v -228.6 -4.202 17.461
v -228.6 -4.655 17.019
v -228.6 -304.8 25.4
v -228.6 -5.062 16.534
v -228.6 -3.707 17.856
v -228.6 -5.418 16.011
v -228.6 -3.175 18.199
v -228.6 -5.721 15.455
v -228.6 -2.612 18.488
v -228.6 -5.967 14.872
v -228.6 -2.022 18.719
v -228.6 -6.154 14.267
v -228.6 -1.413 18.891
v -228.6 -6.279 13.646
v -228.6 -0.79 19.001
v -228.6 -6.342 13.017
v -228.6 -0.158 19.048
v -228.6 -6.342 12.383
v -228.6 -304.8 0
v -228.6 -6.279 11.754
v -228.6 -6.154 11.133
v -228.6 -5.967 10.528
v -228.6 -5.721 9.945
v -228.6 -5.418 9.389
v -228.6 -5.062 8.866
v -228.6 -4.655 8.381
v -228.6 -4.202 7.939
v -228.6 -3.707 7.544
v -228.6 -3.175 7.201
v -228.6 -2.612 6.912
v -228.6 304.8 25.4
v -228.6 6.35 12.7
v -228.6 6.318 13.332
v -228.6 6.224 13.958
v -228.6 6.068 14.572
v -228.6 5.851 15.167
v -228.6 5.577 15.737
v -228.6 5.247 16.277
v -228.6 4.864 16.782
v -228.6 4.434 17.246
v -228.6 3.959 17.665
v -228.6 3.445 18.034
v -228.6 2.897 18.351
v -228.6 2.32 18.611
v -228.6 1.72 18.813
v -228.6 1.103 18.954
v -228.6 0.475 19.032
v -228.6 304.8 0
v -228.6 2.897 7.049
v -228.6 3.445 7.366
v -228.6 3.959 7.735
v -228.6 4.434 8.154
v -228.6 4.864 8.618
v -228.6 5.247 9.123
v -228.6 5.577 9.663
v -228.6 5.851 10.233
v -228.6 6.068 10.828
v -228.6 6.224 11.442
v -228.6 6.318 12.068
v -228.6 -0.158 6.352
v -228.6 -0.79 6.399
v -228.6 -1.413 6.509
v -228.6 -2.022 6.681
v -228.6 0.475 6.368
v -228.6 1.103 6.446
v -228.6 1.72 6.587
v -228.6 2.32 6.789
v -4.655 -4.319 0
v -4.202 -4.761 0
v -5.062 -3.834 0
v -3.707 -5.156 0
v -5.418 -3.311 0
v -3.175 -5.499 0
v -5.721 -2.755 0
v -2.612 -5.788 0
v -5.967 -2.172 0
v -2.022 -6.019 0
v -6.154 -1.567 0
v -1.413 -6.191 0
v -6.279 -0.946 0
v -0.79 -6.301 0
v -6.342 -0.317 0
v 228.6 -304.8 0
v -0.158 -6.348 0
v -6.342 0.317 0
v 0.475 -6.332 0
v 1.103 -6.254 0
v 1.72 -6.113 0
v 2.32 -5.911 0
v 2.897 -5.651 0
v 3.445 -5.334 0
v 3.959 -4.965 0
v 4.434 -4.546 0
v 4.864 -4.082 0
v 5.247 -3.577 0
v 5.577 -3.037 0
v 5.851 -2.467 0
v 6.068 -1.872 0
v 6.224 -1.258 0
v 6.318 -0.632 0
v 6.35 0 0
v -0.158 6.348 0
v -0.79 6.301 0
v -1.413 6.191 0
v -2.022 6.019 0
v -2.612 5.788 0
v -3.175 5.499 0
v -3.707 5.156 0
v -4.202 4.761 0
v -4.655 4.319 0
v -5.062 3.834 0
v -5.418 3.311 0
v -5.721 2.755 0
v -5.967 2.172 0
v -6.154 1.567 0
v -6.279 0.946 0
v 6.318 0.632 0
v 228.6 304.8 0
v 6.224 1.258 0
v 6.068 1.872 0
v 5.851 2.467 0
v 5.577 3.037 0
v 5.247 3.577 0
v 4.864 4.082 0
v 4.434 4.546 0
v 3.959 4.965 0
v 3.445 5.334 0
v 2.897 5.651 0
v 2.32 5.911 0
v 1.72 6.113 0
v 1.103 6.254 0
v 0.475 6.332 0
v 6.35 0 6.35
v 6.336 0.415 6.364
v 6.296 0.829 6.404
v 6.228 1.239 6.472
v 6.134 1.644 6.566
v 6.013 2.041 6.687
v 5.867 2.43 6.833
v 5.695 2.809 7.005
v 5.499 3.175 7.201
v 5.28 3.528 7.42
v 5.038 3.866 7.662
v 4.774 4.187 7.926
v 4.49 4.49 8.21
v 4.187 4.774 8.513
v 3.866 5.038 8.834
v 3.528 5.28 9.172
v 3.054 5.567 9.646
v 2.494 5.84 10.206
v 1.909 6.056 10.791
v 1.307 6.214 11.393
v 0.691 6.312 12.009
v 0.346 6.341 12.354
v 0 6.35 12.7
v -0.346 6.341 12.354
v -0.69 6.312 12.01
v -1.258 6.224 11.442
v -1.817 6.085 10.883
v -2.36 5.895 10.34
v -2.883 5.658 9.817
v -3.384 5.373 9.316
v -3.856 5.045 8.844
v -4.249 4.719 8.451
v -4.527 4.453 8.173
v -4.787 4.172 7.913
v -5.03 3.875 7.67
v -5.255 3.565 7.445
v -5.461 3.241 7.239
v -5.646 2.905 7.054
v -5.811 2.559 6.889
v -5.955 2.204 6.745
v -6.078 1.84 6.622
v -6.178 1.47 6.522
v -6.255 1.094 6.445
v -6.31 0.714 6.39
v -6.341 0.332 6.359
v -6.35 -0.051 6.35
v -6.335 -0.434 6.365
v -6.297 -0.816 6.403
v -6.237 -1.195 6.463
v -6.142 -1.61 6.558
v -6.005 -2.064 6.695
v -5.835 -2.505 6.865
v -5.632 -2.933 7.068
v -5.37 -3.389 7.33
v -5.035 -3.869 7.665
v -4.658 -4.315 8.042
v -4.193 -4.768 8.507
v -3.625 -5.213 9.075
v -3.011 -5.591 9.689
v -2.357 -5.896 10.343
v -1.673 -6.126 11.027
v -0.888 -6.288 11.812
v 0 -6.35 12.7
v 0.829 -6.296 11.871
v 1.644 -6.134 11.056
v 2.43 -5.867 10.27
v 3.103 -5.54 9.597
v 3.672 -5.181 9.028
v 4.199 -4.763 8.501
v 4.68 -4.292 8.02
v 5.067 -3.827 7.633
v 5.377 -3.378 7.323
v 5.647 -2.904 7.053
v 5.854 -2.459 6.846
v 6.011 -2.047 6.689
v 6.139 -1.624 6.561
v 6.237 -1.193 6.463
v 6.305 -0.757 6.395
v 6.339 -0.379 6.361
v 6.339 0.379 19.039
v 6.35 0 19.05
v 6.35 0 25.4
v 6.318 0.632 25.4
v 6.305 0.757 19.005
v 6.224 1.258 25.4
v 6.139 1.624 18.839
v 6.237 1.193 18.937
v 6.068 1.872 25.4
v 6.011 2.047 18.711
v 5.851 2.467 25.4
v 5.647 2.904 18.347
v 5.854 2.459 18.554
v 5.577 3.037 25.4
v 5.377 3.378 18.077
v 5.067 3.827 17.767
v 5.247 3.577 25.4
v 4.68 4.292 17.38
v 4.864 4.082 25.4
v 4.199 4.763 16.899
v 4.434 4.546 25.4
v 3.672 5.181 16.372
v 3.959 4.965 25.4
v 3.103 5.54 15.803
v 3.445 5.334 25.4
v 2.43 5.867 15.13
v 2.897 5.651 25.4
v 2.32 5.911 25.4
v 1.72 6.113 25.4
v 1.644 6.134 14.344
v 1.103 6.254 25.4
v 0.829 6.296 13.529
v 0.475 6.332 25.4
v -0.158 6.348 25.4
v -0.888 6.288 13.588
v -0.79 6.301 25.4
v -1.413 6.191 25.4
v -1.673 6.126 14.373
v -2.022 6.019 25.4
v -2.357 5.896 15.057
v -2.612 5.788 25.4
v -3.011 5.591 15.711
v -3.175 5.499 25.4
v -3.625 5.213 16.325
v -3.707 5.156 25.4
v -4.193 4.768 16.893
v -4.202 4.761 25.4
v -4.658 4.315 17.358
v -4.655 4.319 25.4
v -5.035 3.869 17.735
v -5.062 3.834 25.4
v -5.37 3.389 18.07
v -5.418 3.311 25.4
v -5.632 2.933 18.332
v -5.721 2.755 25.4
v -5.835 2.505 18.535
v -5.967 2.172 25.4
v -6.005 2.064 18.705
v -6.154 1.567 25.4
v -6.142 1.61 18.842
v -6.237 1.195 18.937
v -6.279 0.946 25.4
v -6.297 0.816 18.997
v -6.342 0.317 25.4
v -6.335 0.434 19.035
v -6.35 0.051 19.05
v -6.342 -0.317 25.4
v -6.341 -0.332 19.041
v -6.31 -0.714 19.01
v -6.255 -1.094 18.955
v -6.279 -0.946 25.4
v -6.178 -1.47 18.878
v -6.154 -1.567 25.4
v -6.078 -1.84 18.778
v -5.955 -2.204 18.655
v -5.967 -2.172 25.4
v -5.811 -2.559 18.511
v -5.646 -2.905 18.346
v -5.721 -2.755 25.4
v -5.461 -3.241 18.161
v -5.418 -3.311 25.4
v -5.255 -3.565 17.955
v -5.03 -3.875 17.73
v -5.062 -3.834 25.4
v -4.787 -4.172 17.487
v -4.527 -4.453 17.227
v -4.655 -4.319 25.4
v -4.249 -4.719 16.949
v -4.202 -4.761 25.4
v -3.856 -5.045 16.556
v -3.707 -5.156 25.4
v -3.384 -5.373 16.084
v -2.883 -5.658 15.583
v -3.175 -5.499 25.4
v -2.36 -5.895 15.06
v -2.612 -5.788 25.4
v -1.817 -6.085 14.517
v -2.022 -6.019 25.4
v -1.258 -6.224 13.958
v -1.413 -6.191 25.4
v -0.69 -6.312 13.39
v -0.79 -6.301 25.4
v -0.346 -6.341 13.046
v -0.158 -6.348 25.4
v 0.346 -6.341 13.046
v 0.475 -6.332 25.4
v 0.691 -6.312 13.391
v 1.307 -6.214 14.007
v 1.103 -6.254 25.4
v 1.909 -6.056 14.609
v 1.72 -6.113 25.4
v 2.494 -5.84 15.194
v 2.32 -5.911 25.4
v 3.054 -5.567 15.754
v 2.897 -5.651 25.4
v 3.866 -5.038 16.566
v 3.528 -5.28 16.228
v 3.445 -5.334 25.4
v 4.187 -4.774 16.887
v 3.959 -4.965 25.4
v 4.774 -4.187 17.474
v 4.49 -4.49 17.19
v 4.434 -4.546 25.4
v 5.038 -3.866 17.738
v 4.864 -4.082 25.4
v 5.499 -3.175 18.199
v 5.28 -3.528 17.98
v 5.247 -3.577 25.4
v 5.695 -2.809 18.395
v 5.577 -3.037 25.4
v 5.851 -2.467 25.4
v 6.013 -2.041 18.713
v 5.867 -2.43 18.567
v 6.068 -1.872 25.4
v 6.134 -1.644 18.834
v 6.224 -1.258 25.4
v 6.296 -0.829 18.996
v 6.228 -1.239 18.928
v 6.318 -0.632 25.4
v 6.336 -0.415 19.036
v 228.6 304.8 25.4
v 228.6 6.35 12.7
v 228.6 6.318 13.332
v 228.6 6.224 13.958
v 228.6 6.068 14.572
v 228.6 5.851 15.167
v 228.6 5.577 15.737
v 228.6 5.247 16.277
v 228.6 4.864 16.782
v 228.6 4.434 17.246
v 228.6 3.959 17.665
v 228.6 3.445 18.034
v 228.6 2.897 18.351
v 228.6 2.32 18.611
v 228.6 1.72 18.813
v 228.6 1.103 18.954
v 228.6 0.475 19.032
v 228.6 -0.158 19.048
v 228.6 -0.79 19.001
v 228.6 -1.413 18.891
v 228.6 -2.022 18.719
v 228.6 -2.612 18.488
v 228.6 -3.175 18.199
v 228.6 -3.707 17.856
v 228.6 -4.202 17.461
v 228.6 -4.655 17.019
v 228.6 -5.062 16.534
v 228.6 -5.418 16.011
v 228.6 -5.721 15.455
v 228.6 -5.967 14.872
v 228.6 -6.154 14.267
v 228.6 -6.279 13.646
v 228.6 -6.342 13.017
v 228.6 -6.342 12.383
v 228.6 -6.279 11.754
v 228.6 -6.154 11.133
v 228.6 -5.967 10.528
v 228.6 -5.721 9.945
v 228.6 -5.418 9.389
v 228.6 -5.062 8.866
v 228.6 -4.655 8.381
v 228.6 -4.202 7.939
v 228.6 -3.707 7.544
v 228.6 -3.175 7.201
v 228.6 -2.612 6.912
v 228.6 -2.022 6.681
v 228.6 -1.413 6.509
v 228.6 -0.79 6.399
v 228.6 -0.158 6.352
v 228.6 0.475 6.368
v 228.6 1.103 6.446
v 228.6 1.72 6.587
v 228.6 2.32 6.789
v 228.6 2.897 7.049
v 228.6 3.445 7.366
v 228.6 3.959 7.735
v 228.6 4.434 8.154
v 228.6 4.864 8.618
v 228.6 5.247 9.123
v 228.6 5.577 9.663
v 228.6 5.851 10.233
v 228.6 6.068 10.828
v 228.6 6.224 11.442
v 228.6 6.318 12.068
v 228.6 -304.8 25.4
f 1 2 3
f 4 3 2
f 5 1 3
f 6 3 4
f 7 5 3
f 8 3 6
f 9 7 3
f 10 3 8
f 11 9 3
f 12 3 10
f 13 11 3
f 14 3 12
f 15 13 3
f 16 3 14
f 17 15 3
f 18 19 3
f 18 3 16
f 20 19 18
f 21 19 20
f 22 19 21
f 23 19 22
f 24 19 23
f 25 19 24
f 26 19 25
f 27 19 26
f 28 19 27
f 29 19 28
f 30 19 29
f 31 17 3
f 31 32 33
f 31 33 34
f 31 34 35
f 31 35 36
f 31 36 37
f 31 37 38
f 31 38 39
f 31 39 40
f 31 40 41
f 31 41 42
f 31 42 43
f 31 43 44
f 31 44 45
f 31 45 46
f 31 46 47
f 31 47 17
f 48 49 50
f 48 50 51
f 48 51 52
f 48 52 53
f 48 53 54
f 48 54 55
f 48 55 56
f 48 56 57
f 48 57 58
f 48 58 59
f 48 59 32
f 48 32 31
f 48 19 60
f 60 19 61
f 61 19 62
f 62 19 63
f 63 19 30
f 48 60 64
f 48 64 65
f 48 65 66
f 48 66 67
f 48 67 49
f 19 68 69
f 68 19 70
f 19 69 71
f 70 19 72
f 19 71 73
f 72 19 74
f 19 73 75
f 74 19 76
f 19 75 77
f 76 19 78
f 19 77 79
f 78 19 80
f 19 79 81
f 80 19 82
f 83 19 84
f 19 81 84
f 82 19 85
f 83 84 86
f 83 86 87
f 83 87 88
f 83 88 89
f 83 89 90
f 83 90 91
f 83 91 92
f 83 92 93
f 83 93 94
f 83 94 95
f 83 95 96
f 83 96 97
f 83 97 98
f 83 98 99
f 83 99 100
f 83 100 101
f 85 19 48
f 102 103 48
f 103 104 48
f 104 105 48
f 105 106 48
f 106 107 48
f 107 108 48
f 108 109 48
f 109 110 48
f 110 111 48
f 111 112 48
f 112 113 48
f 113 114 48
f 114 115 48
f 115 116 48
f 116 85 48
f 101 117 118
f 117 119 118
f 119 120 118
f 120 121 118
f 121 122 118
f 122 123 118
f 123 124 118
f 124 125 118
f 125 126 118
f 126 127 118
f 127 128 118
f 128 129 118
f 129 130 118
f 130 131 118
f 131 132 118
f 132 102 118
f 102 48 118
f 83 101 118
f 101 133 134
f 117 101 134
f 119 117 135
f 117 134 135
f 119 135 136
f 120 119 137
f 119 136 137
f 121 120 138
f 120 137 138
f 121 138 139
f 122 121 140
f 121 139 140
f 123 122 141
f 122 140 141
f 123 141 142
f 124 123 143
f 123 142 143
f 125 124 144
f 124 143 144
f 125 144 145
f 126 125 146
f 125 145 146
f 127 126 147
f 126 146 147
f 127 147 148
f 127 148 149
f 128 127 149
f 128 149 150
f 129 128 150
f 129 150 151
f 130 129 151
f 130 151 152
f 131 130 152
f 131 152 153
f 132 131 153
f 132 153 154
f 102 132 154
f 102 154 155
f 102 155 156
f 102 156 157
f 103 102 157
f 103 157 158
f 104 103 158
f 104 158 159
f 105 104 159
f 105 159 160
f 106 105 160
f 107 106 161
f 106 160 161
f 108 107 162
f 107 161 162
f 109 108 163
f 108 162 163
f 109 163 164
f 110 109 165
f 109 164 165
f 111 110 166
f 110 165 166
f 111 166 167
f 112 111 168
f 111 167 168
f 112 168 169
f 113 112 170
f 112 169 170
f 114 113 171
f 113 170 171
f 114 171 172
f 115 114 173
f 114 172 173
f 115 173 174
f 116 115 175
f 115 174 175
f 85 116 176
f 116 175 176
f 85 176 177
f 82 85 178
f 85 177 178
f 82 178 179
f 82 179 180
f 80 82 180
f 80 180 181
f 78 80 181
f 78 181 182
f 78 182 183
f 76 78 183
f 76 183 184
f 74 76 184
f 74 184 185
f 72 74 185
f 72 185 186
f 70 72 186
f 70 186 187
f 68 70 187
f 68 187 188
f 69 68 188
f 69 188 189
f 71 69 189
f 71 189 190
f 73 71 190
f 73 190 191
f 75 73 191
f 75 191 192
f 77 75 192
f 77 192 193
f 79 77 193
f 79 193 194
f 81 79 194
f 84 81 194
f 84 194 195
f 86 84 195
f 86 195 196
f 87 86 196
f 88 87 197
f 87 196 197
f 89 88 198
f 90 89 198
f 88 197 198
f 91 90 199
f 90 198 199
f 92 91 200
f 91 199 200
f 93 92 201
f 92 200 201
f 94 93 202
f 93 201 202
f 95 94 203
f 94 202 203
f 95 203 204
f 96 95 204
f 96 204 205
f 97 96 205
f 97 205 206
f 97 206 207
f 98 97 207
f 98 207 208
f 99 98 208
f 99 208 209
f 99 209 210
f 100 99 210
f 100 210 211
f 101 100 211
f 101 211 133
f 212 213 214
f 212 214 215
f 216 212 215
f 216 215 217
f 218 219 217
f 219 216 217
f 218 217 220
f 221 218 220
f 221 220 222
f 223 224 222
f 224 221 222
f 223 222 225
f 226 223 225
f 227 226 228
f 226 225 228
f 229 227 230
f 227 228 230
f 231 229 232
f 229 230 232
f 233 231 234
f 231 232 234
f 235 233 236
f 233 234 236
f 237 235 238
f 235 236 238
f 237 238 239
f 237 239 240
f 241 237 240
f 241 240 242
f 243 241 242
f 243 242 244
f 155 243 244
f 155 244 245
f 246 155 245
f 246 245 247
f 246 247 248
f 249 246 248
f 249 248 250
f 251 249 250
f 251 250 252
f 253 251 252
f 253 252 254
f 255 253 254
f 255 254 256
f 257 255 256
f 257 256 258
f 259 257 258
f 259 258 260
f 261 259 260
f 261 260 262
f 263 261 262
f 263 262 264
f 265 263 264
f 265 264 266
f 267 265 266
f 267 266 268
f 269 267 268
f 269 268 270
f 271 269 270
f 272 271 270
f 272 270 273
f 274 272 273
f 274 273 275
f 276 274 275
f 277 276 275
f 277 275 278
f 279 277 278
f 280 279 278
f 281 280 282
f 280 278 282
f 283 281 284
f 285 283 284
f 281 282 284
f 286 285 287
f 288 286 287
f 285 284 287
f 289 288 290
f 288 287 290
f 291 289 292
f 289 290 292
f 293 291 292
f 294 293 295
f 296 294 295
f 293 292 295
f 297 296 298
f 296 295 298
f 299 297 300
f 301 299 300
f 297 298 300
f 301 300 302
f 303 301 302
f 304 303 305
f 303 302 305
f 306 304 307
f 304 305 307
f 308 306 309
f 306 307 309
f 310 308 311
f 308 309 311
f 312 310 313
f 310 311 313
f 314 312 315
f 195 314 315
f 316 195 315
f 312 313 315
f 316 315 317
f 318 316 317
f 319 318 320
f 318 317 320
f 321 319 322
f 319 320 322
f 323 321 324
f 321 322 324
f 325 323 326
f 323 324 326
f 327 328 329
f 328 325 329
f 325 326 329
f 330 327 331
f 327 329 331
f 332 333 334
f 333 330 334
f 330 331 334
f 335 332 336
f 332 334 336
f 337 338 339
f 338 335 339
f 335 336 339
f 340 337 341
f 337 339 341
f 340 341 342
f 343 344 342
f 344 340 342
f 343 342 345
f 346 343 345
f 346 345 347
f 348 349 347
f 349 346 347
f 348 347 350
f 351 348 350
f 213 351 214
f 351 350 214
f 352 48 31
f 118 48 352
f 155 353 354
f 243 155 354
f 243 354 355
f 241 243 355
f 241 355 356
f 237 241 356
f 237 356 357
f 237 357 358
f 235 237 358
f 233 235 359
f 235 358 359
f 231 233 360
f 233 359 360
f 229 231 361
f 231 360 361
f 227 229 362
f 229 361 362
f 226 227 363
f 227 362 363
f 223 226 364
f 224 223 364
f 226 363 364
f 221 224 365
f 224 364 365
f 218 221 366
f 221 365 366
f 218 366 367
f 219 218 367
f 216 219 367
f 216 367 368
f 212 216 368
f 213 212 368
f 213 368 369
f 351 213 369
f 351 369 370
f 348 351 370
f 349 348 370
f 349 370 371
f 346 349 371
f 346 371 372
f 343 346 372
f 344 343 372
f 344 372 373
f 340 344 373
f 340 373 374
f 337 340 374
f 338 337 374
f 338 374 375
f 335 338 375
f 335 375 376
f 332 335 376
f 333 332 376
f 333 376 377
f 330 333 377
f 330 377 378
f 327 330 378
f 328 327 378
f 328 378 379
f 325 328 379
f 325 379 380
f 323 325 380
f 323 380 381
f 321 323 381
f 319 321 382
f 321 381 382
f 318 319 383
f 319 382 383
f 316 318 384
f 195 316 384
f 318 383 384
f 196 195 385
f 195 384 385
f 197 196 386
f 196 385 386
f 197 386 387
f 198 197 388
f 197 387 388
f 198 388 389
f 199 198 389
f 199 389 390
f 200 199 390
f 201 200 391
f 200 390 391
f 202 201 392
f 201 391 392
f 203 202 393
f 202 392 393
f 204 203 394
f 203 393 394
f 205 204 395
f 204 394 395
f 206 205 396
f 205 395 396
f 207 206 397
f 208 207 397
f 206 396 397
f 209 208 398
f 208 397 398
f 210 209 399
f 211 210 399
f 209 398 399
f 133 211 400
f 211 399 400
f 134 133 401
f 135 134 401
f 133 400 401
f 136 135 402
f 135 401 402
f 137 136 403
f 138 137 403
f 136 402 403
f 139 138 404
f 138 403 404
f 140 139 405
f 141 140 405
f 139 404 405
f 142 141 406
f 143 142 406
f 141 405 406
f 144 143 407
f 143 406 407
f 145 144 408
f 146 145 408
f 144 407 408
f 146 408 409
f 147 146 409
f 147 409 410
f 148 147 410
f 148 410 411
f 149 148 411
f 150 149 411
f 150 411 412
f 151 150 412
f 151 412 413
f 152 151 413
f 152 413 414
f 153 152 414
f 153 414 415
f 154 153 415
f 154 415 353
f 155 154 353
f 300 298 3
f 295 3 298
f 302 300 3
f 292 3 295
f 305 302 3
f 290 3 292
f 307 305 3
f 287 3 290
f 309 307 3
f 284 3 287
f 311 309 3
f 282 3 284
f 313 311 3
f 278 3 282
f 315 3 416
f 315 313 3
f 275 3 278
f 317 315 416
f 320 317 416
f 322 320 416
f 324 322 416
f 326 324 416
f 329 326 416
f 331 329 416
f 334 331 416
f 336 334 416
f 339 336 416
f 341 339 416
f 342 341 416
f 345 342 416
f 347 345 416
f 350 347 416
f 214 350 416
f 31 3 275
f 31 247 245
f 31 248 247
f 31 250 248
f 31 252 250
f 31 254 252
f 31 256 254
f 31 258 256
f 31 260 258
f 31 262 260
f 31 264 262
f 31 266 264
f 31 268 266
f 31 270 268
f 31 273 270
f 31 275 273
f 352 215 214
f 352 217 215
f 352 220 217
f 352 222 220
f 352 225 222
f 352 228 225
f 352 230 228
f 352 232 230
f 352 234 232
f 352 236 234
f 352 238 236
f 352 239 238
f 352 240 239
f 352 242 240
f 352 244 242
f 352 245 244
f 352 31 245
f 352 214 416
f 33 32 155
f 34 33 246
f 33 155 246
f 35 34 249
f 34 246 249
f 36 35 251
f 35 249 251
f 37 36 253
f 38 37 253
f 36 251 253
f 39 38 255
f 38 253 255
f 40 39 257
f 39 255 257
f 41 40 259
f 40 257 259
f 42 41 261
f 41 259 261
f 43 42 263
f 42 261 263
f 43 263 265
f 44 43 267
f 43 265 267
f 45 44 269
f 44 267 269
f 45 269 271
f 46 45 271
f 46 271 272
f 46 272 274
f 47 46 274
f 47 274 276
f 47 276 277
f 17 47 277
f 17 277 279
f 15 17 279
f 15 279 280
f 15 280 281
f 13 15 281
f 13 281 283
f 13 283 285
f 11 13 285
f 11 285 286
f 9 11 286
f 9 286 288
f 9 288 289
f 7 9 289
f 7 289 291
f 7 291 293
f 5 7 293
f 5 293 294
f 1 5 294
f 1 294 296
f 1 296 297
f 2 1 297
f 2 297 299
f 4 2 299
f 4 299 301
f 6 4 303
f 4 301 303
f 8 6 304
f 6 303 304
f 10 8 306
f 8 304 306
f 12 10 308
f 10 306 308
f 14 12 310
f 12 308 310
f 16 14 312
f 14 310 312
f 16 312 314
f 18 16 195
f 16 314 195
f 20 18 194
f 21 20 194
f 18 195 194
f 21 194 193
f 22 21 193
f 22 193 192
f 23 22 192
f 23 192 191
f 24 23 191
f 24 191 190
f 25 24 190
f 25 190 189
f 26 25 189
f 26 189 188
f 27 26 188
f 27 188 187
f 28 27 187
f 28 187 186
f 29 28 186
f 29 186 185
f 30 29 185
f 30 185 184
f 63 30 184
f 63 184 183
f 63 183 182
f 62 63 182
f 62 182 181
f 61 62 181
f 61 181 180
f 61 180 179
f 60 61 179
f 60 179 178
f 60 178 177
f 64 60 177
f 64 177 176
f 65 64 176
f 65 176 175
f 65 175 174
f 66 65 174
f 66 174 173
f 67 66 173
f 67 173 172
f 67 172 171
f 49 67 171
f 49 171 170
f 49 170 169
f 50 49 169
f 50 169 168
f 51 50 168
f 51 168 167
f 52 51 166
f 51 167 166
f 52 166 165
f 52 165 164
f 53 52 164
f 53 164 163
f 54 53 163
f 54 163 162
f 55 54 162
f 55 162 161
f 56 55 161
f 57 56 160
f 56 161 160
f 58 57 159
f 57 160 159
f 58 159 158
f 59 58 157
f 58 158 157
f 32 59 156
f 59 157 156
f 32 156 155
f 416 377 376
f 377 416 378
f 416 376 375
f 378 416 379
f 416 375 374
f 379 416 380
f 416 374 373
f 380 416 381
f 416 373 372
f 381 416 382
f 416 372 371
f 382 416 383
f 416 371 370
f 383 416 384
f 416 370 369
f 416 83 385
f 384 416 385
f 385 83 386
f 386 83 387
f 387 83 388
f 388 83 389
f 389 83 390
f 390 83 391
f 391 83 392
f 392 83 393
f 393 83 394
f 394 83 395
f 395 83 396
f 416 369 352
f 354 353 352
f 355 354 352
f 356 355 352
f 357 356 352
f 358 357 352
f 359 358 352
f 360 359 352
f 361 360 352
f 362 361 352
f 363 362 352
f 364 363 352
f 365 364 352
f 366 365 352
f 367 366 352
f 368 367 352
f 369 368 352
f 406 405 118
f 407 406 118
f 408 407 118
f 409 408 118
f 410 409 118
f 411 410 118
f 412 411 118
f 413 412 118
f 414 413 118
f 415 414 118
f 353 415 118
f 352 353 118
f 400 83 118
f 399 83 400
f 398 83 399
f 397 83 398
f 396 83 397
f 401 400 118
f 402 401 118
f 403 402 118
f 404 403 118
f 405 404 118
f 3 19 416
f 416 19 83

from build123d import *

# Parameters (mm, degrees)
F0_W     = 457.2
F0_H     = 609.6
F1_DEPTH = 25.4
F2_R     = 6.35
F3_DEPTH = 762
F4_R     = 6.35
F5_DEPTH = 25.4


with BuildPart() as f1:
    # F0 (on Top) → F1 (new body)
    with BuildSketch(Plane.XY):
        Rectangle(F0_W, F0_H)
    extrude(amount=F1_DEPTH)

    # F2 (on face) → F3 (cut)
    with BuildSketch(Plane.YZ.offset(228.6)):
        with Locations((0, 12.7)):
            Circle(F2_R)
    extrude(amount=-F3_DEPTH, mode=Mode.SUBTRACT)

    # F4 (on face) → F5 (cut)
    with BuildSketch(Plane.XY.offset(25.4)):
        Circle(F4_R)
    extrude(amount=-F5_DEPTH, mode=Mode.SUBTRACT)


solid = f1.part
